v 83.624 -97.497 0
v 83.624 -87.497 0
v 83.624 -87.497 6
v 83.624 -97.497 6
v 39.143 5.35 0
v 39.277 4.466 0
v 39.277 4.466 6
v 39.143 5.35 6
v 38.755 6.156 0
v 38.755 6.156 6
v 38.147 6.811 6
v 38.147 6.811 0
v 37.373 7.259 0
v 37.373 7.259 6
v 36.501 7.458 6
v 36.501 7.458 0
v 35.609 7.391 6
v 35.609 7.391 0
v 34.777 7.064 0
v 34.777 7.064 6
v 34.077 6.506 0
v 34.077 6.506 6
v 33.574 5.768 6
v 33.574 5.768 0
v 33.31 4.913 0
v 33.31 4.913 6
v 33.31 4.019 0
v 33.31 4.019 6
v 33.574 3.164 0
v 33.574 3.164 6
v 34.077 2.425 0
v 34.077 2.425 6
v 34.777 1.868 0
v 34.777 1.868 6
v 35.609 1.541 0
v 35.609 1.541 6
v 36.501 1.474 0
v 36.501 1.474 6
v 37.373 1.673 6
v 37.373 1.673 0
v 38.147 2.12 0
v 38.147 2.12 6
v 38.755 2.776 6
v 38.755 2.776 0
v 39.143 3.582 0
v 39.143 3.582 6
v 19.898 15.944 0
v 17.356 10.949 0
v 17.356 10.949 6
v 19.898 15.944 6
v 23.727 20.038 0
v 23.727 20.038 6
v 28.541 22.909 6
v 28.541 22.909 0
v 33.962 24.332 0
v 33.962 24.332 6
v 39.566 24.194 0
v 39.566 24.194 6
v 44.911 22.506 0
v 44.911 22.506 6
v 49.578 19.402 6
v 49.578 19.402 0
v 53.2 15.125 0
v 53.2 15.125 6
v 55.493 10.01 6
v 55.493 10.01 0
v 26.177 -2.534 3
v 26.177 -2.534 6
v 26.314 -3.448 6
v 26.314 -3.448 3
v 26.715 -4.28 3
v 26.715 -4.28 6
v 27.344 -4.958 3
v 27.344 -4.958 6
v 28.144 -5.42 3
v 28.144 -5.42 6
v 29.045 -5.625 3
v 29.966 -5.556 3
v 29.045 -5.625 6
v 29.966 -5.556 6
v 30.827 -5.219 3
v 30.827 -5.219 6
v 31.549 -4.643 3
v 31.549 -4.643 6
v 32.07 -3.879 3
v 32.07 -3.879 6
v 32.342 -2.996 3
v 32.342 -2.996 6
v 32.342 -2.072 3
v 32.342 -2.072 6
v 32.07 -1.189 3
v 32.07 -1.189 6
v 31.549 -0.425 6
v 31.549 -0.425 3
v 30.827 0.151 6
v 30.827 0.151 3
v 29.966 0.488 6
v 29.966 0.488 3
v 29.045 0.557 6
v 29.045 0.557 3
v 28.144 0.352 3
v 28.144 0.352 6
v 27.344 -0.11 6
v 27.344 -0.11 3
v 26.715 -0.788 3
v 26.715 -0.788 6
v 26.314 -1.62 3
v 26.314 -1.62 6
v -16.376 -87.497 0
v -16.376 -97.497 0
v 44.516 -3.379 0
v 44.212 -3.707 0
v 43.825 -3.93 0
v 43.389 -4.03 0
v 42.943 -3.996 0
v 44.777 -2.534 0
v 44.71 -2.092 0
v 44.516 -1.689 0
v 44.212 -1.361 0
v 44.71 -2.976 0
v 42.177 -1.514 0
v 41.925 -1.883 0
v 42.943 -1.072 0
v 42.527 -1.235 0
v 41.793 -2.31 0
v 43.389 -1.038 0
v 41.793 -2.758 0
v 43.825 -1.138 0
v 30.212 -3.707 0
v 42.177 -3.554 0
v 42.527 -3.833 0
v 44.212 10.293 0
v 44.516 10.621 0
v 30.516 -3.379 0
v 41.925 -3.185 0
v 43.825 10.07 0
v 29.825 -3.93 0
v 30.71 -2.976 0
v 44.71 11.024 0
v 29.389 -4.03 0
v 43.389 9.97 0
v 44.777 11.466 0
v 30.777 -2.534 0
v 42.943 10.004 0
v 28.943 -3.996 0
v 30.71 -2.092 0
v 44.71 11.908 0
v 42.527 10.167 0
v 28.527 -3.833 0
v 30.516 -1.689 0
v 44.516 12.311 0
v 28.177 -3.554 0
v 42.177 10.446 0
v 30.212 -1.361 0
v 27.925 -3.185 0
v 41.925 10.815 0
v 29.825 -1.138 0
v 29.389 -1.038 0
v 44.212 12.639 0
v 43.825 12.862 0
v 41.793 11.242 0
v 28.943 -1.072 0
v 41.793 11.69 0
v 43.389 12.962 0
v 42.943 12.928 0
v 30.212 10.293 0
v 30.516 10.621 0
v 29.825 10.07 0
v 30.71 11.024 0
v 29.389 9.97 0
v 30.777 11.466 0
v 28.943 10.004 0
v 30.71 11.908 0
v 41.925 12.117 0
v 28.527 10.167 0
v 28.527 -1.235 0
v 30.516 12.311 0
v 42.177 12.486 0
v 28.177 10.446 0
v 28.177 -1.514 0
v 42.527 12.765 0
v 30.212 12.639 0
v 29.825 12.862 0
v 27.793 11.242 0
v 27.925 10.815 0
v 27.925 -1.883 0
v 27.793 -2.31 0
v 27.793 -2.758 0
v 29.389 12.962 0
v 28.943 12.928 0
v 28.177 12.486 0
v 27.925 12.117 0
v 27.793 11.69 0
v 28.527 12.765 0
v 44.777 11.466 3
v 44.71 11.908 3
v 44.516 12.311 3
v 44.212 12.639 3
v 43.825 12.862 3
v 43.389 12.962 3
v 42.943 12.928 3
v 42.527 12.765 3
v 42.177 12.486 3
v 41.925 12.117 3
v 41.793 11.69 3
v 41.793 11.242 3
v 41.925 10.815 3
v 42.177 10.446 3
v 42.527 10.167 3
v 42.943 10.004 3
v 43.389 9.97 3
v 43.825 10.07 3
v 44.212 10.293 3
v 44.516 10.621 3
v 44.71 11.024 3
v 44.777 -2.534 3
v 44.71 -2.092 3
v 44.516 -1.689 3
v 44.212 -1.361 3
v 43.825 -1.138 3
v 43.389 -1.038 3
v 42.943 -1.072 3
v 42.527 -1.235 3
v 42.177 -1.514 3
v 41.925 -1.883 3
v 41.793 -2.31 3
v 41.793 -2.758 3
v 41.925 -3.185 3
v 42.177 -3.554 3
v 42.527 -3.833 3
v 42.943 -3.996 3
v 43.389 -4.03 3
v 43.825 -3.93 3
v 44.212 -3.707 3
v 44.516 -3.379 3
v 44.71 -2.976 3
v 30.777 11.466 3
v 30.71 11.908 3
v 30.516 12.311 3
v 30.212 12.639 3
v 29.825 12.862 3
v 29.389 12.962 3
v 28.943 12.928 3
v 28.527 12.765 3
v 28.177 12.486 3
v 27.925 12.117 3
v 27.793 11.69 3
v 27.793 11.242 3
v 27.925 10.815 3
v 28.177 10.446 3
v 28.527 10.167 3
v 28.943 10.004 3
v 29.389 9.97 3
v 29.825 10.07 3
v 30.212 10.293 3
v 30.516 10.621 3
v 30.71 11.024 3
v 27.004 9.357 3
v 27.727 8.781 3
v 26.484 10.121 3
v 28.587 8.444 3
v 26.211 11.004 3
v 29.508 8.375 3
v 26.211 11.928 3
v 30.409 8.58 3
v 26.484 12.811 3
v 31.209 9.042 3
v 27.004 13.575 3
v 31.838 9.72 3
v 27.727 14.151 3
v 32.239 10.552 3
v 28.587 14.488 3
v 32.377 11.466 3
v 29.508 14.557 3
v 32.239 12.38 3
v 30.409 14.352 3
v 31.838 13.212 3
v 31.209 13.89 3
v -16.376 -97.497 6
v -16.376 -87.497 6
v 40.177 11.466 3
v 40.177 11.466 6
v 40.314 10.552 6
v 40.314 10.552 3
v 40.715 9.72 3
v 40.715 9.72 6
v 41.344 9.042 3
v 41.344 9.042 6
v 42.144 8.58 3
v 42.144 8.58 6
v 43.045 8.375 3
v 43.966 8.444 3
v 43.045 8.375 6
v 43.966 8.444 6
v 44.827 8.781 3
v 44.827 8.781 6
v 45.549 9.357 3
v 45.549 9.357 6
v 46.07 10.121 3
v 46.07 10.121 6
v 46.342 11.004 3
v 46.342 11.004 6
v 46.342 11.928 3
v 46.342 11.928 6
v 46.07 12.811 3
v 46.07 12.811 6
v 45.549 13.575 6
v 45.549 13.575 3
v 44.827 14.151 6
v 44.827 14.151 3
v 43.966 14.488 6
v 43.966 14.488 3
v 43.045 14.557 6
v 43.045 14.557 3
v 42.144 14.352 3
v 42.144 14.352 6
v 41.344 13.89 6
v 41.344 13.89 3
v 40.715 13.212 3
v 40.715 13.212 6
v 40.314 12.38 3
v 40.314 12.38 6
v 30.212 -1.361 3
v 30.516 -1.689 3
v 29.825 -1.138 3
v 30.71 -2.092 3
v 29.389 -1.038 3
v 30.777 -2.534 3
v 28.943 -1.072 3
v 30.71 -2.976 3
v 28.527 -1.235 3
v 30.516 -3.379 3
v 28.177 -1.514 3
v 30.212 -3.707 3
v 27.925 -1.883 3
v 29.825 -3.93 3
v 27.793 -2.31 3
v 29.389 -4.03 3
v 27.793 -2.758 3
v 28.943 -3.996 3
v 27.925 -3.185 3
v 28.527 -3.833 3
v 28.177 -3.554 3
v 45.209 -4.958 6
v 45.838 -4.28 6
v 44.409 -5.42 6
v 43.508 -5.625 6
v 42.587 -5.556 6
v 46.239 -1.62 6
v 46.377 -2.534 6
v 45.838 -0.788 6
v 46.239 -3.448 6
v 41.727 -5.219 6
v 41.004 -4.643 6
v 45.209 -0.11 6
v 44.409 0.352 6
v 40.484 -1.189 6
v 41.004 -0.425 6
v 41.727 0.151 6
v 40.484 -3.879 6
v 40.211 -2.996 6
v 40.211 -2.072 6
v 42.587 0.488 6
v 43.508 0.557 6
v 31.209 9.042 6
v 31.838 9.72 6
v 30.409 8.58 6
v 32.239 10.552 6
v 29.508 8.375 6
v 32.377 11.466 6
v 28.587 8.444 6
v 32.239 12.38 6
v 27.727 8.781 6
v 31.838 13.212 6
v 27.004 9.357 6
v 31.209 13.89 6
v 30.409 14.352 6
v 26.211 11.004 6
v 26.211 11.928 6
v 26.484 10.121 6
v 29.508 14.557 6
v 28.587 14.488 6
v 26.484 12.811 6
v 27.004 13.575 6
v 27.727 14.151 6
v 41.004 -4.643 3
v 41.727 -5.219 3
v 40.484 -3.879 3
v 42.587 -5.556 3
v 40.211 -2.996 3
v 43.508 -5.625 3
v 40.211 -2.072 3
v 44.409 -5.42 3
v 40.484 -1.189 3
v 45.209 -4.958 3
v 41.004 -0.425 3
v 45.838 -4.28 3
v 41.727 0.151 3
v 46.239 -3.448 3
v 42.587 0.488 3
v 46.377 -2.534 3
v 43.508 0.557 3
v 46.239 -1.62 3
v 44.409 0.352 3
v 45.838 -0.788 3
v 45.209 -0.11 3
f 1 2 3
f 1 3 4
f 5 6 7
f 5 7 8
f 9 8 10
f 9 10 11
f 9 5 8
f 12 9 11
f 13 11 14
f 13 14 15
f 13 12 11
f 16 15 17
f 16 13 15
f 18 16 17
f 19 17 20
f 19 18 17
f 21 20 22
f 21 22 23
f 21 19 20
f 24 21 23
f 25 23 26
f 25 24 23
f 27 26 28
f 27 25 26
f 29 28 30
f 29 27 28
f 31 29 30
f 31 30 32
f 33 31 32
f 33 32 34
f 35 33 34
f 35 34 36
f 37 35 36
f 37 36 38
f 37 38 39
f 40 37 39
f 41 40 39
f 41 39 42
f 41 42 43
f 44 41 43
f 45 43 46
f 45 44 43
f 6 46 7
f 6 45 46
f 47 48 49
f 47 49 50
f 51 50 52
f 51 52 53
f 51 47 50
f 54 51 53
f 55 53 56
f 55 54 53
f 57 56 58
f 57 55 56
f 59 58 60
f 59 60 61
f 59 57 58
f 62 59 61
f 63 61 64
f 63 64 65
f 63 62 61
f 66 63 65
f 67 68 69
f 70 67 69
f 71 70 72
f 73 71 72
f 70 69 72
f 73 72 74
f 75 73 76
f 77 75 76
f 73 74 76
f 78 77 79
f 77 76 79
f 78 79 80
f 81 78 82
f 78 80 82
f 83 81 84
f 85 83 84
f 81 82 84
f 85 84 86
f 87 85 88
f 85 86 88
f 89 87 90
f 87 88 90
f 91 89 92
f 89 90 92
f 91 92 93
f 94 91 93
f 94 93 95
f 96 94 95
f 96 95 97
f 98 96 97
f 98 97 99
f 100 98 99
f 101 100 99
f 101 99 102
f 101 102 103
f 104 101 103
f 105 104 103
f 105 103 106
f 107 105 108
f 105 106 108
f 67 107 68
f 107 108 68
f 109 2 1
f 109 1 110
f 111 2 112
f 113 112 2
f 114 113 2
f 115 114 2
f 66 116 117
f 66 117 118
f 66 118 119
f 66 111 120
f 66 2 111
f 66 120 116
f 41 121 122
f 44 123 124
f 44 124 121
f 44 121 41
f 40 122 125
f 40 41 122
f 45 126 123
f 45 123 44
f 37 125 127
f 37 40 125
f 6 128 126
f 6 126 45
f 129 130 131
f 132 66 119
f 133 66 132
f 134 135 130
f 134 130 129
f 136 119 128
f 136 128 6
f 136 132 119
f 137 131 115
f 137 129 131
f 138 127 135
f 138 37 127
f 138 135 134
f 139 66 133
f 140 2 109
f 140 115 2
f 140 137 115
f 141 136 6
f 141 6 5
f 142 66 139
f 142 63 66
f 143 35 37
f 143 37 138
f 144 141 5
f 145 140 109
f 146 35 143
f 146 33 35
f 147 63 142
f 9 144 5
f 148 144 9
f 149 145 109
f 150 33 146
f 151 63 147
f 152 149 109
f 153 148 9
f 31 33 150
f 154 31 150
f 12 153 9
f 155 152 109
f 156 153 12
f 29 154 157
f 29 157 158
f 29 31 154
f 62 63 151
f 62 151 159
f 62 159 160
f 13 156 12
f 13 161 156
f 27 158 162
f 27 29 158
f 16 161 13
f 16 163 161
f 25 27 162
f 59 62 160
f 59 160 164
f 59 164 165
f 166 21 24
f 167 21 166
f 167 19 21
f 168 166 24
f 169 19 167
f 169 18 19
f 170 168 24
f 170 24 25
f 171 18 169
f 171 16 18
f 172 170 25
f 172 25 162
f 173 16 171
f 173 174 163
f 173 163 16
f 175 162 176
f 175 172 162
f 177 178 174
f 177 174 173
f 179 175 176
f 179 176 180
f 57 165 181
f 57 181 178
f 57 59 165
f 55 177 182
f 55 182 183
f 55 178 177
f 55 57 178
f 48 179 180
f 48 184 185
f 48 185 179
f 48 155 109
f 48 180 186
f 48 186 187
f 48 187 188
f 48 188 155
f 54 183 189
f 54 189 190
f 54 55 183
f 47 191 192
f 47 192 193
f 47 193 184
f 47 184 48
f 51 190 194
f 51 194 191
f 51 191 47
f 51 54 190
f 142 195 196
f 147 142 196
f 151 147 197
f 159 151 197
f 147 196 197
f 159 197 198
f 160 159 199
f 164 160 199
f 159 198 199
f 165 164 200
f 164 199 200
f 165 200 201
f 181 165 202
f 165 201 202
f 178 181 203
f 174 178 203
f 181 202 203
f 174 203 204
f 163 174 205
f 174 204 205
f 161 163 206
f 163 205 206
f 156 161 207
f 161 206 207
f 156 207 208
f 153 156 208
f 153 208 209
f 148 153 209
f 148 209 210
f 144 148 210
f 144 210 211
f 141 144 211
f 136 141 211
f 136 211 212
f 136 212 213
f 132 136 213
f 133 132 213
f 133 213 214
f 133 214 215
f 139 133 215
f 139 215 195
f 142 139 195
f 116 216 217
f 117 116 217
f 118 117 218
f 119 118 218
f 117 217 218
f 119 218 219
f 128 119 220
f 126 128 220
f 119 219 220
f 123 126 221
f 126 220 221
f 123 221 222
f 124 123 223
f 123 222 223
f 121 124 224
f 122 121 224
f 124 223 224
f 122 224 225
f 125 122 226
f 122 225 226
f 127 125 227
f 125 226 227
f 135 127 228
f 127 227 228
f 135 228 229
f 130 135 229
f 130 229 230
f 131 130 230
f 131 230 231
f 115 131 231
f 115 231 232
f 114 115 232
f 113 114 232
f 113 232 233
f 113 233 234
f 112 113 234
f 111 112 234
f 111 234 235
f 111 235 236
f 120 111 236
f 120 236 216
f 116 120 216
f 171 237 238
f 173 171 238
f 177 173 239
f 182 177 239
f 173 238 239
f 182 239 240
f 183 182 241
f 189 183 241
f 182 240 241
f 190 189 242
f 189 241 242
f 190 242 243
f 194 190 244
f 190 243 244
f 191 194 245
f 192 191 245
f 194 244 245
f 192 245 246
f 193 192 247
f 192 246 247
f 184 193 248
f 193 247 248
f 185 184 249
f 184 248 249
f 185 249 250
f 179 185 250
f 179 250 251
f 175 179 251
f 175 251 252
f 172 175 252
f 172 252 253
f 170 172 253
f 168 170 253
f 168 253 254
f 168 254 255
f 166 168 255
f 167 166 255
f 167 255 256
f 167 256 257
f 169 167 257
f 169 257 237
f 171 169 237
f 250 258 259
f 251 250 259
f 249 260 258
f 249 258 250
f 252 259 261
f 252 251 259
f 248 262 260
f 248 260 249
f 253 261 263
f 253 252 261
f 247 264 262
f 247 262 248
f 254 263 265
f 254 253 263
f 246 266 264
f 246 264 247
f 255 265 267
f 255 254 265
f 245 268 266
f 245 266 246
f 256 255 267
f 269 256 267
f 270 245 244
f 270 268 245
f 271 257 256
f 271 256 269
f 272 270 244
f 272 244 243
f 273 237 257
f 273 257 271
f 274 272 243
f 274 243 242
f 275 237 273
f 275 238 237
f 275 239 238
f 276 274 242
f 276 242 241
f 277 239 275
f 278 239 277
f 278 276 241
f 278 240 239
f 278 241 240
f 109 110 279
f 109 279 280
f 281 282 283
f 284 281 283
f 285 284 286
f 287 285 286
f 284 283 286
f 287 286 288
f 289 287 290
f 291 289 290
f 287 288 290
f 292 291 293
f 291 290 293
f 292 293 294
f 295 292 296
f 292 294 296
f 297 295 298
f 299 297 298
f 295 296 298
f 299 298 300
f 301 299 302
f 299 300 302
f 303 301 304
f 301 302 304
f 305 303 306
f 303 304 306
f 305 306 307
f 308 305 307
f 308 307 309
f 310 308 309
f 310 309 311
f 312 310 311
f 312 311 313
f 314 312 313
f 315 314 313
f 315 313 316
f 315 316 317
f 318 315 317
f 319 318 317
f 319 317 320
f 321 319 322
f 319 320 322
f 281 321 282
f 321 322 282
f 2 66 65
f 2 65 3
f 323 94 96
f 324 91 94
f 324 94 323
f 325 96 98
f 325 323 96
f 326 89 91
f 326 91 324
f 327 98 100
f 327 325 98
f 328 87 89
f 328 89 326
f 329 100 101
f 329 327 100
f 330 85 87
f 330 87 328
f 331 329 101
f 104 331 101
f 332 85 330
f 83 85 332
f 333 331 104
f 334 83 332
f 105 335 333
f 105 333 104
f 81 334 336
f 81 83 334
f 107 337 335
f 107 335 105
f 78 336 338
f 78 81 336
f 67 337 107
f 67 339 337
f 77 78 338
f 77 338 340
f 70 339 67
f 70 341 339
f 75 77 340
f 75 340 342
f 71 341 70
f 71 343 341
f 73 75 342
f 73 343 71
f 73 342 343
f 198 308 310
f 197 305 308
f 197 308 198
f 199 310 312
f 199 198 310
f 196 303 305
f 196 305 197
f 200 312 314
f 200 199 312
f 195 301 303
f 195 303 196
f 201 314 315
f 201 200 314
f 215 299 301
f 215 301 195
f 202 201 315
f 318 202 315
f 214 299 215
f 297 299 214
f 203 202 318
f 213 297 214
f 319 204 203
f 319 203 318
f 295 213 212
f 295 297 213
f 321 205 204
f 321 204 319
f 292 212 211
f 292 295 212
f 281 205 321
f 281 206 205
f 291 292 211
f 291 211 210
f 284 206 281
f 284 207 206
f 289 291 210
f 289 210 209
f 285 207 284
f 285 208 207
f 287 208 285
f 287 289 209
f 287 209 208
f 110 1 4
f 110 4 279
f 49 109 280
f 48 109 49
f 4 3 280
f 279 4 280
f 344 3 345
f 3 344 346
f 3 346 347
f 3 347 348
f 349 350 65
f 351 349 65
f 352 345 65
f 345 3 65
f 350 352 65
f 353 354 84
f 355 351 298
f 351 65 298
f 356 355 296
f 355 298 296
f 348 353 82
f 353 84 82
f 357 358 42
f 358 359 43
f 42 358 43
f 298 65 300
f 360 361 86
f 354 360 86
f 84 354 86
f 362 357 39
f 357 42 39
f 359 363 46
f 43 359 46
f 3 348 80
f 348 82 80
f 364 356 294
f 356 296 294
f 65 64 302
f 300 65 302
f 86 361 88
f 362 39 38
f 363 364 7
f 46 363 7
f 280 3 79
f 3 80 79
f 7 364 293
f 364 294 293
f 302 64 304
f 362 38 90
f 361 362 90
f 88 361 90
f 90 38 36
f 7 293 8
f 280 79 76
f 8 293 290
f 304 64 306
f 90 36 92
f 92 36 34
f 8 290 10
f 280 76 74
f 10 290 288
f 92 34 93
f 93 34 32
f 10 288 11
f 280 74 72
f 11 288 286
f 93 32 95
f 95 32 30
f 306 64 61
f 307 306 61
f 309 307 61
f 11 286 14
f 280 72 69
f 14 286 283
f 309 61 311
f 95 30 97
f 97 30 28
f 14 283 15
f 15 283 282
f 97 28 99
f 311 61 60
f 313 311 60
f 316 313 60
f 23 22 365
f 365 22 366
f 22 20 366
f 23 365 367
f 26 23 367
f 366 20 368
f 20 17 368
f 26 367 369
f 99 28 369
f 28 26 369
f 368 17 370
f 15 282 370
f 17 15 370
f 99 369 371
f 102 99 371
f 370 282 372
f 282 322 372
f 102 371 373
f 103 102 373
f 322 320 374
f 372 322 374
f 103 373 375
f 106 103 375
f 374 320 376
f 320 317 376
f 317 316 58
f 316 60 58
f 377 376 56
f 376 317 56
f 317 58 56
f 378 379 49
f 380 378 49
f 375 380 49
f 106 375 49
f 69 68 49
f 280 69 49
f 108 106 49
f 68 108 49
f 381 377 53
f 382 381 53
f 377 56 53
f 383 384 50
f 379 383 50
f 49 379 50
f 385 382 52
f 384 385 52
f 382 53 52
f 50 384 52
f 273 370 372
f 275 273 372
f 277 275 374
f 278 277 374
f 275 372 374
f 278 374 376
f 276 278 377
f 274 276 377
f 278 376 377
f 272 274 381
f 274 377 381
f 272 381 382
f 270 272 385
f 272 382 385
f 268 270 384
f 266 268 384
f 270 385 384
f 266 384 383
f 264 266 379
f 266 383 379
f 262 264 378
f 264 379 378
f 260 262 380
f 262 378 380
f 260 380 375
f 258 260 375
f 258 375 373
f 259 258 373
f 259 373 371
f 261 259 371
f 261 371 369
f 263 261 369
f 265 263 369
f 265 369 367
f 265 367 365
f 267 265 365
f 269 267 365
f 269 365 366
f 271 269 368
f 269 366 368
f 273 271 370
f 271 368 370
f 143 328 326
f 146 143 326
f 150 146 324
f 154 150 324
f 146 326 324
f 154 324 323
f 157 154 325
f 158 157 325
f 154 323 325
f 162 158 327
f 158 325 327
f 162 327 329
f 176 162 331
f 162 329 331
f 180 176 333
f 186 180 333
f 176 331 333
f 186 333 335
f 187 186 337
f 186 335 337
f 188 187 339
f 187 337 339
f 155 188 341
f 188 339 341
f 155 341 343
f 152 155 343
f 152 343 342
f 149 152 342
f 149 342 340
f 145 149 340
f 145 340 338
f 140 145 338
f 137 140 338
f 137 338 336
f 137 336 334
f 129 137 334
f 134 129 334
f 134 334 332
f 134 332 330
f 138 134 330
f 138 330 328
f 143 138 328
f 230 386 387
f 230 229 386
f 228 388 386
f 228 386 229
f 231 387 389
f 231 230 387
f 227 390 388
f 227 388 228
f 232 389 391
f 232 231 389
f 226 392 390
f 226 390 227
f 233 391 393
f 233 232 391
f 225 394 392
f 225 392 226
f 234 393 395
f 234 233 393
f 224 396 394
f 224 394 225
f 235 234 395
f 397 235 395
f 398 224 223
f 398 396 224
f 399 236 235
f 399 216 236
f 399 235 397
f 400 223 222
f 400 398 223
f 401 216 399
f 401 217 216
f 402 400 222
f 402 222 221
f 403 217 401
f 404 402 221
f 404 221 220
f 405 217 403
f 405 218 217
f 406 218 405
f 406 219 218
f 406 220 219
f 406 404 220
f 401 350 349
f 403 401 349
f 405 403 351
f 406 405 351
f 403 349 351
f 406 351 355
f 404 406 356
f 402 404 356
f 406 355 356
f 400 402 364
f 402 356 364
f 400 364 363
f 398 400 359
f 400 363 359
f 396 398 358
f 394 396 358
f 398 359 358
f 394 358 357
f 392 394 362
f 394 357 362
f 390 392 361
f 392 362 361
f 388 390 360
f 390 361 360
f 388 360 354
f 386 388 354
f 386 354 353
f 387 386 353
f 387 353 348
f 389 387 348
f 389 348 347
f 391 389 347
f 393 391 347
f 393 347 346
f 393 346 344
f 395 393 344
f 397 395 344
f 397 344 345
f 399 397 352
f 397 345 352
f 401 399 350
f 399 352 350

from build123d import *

# Parameters (mm, degrees)
SKETCH_1_R          = 3
EXTRUDE_1_DEPTH     = 6
SKETCH_2_R          = 3.1
CUT_EXTRUDE_6_DEPTH = 3
SKETCH_4_R          = 1.5
CUT_EXTRUDE_7_DEPTH = 129.481995307


with BuildPart() as part:
    # 草图1 → 凸台-拉伸1 (new body)
    with BuildSketch(Plane.XY):
        with BuildLine():
            Line((55.4927663, 10.009964479), (83.62403307, -87.496893342))
            Line((83.62403307, -87.496893342), (83.62403307, -97.496893342))
            Line((83.62403307, -97.496893342), (-16.37596693, -97.496893342))
            Line((-16.37596693, -97.496893342), (-16.37596693, -87.496893342))
            Line((-16.37596693, -87.496893342), (17.356392529, 10.94893296))
            ThreePointArc((17.356392529, 10.94893296), (36.768797098, 24.459911865), (55.4927663, 10.009964479))
        make_face()
        with Locations((36.276519563, 4.465971212)):
            Circle(SKETCH_1_R, mode=Mode.SUBTRACT)
    extrude(amount=EXTRUDE_1_DEPTH)

    # 草图2 → 切除-拉伸6 (cut)
    with BuildSketch(Plane.XY.offset(6)):
        with Locations((29.276519563, 11.465971212)):
            Circle(SKETCH_2_R)
        with Locations(Location((43.276519563, 11.465971212, 0), (0, 0, 180))):
            Circle(SKETCH_2_R)
        with Locations((43.276519563, -2.534028788)):
            Circle(SKETCH_2_R)
        with Locations(Location((29.276519563, -2.534028788, 0), (0, 0, 180))):
            Circle(SKETCH_2_R)
    extrude(amount=-CUT_EXTRUDE_6_DEPTH, mode=Mode.SUBTRACT)

    # 草图4 → 切除-拉伸7 (cut, through all)
    with BuildSketch(Plane.XY.offset(3)):
        with Locations((43.276519563, 11.465971212)):
            Circle(SKETCH_4_R)
        with Locations((43.276519563, -2.534028788)):
            Circle(SKETCH_4_R)
        with Locations((29.276519563, -2.534028788)):
            Circle(SKETCH_4_R)
        with Locations((29.276519563, 11.465971212)):
            Circle(SKETCH_4_R)
    extrude(amount=-CUT_EXTRUDE_7_DEPTH, mode=Mode.SUBTRACT)


solid = part.part
